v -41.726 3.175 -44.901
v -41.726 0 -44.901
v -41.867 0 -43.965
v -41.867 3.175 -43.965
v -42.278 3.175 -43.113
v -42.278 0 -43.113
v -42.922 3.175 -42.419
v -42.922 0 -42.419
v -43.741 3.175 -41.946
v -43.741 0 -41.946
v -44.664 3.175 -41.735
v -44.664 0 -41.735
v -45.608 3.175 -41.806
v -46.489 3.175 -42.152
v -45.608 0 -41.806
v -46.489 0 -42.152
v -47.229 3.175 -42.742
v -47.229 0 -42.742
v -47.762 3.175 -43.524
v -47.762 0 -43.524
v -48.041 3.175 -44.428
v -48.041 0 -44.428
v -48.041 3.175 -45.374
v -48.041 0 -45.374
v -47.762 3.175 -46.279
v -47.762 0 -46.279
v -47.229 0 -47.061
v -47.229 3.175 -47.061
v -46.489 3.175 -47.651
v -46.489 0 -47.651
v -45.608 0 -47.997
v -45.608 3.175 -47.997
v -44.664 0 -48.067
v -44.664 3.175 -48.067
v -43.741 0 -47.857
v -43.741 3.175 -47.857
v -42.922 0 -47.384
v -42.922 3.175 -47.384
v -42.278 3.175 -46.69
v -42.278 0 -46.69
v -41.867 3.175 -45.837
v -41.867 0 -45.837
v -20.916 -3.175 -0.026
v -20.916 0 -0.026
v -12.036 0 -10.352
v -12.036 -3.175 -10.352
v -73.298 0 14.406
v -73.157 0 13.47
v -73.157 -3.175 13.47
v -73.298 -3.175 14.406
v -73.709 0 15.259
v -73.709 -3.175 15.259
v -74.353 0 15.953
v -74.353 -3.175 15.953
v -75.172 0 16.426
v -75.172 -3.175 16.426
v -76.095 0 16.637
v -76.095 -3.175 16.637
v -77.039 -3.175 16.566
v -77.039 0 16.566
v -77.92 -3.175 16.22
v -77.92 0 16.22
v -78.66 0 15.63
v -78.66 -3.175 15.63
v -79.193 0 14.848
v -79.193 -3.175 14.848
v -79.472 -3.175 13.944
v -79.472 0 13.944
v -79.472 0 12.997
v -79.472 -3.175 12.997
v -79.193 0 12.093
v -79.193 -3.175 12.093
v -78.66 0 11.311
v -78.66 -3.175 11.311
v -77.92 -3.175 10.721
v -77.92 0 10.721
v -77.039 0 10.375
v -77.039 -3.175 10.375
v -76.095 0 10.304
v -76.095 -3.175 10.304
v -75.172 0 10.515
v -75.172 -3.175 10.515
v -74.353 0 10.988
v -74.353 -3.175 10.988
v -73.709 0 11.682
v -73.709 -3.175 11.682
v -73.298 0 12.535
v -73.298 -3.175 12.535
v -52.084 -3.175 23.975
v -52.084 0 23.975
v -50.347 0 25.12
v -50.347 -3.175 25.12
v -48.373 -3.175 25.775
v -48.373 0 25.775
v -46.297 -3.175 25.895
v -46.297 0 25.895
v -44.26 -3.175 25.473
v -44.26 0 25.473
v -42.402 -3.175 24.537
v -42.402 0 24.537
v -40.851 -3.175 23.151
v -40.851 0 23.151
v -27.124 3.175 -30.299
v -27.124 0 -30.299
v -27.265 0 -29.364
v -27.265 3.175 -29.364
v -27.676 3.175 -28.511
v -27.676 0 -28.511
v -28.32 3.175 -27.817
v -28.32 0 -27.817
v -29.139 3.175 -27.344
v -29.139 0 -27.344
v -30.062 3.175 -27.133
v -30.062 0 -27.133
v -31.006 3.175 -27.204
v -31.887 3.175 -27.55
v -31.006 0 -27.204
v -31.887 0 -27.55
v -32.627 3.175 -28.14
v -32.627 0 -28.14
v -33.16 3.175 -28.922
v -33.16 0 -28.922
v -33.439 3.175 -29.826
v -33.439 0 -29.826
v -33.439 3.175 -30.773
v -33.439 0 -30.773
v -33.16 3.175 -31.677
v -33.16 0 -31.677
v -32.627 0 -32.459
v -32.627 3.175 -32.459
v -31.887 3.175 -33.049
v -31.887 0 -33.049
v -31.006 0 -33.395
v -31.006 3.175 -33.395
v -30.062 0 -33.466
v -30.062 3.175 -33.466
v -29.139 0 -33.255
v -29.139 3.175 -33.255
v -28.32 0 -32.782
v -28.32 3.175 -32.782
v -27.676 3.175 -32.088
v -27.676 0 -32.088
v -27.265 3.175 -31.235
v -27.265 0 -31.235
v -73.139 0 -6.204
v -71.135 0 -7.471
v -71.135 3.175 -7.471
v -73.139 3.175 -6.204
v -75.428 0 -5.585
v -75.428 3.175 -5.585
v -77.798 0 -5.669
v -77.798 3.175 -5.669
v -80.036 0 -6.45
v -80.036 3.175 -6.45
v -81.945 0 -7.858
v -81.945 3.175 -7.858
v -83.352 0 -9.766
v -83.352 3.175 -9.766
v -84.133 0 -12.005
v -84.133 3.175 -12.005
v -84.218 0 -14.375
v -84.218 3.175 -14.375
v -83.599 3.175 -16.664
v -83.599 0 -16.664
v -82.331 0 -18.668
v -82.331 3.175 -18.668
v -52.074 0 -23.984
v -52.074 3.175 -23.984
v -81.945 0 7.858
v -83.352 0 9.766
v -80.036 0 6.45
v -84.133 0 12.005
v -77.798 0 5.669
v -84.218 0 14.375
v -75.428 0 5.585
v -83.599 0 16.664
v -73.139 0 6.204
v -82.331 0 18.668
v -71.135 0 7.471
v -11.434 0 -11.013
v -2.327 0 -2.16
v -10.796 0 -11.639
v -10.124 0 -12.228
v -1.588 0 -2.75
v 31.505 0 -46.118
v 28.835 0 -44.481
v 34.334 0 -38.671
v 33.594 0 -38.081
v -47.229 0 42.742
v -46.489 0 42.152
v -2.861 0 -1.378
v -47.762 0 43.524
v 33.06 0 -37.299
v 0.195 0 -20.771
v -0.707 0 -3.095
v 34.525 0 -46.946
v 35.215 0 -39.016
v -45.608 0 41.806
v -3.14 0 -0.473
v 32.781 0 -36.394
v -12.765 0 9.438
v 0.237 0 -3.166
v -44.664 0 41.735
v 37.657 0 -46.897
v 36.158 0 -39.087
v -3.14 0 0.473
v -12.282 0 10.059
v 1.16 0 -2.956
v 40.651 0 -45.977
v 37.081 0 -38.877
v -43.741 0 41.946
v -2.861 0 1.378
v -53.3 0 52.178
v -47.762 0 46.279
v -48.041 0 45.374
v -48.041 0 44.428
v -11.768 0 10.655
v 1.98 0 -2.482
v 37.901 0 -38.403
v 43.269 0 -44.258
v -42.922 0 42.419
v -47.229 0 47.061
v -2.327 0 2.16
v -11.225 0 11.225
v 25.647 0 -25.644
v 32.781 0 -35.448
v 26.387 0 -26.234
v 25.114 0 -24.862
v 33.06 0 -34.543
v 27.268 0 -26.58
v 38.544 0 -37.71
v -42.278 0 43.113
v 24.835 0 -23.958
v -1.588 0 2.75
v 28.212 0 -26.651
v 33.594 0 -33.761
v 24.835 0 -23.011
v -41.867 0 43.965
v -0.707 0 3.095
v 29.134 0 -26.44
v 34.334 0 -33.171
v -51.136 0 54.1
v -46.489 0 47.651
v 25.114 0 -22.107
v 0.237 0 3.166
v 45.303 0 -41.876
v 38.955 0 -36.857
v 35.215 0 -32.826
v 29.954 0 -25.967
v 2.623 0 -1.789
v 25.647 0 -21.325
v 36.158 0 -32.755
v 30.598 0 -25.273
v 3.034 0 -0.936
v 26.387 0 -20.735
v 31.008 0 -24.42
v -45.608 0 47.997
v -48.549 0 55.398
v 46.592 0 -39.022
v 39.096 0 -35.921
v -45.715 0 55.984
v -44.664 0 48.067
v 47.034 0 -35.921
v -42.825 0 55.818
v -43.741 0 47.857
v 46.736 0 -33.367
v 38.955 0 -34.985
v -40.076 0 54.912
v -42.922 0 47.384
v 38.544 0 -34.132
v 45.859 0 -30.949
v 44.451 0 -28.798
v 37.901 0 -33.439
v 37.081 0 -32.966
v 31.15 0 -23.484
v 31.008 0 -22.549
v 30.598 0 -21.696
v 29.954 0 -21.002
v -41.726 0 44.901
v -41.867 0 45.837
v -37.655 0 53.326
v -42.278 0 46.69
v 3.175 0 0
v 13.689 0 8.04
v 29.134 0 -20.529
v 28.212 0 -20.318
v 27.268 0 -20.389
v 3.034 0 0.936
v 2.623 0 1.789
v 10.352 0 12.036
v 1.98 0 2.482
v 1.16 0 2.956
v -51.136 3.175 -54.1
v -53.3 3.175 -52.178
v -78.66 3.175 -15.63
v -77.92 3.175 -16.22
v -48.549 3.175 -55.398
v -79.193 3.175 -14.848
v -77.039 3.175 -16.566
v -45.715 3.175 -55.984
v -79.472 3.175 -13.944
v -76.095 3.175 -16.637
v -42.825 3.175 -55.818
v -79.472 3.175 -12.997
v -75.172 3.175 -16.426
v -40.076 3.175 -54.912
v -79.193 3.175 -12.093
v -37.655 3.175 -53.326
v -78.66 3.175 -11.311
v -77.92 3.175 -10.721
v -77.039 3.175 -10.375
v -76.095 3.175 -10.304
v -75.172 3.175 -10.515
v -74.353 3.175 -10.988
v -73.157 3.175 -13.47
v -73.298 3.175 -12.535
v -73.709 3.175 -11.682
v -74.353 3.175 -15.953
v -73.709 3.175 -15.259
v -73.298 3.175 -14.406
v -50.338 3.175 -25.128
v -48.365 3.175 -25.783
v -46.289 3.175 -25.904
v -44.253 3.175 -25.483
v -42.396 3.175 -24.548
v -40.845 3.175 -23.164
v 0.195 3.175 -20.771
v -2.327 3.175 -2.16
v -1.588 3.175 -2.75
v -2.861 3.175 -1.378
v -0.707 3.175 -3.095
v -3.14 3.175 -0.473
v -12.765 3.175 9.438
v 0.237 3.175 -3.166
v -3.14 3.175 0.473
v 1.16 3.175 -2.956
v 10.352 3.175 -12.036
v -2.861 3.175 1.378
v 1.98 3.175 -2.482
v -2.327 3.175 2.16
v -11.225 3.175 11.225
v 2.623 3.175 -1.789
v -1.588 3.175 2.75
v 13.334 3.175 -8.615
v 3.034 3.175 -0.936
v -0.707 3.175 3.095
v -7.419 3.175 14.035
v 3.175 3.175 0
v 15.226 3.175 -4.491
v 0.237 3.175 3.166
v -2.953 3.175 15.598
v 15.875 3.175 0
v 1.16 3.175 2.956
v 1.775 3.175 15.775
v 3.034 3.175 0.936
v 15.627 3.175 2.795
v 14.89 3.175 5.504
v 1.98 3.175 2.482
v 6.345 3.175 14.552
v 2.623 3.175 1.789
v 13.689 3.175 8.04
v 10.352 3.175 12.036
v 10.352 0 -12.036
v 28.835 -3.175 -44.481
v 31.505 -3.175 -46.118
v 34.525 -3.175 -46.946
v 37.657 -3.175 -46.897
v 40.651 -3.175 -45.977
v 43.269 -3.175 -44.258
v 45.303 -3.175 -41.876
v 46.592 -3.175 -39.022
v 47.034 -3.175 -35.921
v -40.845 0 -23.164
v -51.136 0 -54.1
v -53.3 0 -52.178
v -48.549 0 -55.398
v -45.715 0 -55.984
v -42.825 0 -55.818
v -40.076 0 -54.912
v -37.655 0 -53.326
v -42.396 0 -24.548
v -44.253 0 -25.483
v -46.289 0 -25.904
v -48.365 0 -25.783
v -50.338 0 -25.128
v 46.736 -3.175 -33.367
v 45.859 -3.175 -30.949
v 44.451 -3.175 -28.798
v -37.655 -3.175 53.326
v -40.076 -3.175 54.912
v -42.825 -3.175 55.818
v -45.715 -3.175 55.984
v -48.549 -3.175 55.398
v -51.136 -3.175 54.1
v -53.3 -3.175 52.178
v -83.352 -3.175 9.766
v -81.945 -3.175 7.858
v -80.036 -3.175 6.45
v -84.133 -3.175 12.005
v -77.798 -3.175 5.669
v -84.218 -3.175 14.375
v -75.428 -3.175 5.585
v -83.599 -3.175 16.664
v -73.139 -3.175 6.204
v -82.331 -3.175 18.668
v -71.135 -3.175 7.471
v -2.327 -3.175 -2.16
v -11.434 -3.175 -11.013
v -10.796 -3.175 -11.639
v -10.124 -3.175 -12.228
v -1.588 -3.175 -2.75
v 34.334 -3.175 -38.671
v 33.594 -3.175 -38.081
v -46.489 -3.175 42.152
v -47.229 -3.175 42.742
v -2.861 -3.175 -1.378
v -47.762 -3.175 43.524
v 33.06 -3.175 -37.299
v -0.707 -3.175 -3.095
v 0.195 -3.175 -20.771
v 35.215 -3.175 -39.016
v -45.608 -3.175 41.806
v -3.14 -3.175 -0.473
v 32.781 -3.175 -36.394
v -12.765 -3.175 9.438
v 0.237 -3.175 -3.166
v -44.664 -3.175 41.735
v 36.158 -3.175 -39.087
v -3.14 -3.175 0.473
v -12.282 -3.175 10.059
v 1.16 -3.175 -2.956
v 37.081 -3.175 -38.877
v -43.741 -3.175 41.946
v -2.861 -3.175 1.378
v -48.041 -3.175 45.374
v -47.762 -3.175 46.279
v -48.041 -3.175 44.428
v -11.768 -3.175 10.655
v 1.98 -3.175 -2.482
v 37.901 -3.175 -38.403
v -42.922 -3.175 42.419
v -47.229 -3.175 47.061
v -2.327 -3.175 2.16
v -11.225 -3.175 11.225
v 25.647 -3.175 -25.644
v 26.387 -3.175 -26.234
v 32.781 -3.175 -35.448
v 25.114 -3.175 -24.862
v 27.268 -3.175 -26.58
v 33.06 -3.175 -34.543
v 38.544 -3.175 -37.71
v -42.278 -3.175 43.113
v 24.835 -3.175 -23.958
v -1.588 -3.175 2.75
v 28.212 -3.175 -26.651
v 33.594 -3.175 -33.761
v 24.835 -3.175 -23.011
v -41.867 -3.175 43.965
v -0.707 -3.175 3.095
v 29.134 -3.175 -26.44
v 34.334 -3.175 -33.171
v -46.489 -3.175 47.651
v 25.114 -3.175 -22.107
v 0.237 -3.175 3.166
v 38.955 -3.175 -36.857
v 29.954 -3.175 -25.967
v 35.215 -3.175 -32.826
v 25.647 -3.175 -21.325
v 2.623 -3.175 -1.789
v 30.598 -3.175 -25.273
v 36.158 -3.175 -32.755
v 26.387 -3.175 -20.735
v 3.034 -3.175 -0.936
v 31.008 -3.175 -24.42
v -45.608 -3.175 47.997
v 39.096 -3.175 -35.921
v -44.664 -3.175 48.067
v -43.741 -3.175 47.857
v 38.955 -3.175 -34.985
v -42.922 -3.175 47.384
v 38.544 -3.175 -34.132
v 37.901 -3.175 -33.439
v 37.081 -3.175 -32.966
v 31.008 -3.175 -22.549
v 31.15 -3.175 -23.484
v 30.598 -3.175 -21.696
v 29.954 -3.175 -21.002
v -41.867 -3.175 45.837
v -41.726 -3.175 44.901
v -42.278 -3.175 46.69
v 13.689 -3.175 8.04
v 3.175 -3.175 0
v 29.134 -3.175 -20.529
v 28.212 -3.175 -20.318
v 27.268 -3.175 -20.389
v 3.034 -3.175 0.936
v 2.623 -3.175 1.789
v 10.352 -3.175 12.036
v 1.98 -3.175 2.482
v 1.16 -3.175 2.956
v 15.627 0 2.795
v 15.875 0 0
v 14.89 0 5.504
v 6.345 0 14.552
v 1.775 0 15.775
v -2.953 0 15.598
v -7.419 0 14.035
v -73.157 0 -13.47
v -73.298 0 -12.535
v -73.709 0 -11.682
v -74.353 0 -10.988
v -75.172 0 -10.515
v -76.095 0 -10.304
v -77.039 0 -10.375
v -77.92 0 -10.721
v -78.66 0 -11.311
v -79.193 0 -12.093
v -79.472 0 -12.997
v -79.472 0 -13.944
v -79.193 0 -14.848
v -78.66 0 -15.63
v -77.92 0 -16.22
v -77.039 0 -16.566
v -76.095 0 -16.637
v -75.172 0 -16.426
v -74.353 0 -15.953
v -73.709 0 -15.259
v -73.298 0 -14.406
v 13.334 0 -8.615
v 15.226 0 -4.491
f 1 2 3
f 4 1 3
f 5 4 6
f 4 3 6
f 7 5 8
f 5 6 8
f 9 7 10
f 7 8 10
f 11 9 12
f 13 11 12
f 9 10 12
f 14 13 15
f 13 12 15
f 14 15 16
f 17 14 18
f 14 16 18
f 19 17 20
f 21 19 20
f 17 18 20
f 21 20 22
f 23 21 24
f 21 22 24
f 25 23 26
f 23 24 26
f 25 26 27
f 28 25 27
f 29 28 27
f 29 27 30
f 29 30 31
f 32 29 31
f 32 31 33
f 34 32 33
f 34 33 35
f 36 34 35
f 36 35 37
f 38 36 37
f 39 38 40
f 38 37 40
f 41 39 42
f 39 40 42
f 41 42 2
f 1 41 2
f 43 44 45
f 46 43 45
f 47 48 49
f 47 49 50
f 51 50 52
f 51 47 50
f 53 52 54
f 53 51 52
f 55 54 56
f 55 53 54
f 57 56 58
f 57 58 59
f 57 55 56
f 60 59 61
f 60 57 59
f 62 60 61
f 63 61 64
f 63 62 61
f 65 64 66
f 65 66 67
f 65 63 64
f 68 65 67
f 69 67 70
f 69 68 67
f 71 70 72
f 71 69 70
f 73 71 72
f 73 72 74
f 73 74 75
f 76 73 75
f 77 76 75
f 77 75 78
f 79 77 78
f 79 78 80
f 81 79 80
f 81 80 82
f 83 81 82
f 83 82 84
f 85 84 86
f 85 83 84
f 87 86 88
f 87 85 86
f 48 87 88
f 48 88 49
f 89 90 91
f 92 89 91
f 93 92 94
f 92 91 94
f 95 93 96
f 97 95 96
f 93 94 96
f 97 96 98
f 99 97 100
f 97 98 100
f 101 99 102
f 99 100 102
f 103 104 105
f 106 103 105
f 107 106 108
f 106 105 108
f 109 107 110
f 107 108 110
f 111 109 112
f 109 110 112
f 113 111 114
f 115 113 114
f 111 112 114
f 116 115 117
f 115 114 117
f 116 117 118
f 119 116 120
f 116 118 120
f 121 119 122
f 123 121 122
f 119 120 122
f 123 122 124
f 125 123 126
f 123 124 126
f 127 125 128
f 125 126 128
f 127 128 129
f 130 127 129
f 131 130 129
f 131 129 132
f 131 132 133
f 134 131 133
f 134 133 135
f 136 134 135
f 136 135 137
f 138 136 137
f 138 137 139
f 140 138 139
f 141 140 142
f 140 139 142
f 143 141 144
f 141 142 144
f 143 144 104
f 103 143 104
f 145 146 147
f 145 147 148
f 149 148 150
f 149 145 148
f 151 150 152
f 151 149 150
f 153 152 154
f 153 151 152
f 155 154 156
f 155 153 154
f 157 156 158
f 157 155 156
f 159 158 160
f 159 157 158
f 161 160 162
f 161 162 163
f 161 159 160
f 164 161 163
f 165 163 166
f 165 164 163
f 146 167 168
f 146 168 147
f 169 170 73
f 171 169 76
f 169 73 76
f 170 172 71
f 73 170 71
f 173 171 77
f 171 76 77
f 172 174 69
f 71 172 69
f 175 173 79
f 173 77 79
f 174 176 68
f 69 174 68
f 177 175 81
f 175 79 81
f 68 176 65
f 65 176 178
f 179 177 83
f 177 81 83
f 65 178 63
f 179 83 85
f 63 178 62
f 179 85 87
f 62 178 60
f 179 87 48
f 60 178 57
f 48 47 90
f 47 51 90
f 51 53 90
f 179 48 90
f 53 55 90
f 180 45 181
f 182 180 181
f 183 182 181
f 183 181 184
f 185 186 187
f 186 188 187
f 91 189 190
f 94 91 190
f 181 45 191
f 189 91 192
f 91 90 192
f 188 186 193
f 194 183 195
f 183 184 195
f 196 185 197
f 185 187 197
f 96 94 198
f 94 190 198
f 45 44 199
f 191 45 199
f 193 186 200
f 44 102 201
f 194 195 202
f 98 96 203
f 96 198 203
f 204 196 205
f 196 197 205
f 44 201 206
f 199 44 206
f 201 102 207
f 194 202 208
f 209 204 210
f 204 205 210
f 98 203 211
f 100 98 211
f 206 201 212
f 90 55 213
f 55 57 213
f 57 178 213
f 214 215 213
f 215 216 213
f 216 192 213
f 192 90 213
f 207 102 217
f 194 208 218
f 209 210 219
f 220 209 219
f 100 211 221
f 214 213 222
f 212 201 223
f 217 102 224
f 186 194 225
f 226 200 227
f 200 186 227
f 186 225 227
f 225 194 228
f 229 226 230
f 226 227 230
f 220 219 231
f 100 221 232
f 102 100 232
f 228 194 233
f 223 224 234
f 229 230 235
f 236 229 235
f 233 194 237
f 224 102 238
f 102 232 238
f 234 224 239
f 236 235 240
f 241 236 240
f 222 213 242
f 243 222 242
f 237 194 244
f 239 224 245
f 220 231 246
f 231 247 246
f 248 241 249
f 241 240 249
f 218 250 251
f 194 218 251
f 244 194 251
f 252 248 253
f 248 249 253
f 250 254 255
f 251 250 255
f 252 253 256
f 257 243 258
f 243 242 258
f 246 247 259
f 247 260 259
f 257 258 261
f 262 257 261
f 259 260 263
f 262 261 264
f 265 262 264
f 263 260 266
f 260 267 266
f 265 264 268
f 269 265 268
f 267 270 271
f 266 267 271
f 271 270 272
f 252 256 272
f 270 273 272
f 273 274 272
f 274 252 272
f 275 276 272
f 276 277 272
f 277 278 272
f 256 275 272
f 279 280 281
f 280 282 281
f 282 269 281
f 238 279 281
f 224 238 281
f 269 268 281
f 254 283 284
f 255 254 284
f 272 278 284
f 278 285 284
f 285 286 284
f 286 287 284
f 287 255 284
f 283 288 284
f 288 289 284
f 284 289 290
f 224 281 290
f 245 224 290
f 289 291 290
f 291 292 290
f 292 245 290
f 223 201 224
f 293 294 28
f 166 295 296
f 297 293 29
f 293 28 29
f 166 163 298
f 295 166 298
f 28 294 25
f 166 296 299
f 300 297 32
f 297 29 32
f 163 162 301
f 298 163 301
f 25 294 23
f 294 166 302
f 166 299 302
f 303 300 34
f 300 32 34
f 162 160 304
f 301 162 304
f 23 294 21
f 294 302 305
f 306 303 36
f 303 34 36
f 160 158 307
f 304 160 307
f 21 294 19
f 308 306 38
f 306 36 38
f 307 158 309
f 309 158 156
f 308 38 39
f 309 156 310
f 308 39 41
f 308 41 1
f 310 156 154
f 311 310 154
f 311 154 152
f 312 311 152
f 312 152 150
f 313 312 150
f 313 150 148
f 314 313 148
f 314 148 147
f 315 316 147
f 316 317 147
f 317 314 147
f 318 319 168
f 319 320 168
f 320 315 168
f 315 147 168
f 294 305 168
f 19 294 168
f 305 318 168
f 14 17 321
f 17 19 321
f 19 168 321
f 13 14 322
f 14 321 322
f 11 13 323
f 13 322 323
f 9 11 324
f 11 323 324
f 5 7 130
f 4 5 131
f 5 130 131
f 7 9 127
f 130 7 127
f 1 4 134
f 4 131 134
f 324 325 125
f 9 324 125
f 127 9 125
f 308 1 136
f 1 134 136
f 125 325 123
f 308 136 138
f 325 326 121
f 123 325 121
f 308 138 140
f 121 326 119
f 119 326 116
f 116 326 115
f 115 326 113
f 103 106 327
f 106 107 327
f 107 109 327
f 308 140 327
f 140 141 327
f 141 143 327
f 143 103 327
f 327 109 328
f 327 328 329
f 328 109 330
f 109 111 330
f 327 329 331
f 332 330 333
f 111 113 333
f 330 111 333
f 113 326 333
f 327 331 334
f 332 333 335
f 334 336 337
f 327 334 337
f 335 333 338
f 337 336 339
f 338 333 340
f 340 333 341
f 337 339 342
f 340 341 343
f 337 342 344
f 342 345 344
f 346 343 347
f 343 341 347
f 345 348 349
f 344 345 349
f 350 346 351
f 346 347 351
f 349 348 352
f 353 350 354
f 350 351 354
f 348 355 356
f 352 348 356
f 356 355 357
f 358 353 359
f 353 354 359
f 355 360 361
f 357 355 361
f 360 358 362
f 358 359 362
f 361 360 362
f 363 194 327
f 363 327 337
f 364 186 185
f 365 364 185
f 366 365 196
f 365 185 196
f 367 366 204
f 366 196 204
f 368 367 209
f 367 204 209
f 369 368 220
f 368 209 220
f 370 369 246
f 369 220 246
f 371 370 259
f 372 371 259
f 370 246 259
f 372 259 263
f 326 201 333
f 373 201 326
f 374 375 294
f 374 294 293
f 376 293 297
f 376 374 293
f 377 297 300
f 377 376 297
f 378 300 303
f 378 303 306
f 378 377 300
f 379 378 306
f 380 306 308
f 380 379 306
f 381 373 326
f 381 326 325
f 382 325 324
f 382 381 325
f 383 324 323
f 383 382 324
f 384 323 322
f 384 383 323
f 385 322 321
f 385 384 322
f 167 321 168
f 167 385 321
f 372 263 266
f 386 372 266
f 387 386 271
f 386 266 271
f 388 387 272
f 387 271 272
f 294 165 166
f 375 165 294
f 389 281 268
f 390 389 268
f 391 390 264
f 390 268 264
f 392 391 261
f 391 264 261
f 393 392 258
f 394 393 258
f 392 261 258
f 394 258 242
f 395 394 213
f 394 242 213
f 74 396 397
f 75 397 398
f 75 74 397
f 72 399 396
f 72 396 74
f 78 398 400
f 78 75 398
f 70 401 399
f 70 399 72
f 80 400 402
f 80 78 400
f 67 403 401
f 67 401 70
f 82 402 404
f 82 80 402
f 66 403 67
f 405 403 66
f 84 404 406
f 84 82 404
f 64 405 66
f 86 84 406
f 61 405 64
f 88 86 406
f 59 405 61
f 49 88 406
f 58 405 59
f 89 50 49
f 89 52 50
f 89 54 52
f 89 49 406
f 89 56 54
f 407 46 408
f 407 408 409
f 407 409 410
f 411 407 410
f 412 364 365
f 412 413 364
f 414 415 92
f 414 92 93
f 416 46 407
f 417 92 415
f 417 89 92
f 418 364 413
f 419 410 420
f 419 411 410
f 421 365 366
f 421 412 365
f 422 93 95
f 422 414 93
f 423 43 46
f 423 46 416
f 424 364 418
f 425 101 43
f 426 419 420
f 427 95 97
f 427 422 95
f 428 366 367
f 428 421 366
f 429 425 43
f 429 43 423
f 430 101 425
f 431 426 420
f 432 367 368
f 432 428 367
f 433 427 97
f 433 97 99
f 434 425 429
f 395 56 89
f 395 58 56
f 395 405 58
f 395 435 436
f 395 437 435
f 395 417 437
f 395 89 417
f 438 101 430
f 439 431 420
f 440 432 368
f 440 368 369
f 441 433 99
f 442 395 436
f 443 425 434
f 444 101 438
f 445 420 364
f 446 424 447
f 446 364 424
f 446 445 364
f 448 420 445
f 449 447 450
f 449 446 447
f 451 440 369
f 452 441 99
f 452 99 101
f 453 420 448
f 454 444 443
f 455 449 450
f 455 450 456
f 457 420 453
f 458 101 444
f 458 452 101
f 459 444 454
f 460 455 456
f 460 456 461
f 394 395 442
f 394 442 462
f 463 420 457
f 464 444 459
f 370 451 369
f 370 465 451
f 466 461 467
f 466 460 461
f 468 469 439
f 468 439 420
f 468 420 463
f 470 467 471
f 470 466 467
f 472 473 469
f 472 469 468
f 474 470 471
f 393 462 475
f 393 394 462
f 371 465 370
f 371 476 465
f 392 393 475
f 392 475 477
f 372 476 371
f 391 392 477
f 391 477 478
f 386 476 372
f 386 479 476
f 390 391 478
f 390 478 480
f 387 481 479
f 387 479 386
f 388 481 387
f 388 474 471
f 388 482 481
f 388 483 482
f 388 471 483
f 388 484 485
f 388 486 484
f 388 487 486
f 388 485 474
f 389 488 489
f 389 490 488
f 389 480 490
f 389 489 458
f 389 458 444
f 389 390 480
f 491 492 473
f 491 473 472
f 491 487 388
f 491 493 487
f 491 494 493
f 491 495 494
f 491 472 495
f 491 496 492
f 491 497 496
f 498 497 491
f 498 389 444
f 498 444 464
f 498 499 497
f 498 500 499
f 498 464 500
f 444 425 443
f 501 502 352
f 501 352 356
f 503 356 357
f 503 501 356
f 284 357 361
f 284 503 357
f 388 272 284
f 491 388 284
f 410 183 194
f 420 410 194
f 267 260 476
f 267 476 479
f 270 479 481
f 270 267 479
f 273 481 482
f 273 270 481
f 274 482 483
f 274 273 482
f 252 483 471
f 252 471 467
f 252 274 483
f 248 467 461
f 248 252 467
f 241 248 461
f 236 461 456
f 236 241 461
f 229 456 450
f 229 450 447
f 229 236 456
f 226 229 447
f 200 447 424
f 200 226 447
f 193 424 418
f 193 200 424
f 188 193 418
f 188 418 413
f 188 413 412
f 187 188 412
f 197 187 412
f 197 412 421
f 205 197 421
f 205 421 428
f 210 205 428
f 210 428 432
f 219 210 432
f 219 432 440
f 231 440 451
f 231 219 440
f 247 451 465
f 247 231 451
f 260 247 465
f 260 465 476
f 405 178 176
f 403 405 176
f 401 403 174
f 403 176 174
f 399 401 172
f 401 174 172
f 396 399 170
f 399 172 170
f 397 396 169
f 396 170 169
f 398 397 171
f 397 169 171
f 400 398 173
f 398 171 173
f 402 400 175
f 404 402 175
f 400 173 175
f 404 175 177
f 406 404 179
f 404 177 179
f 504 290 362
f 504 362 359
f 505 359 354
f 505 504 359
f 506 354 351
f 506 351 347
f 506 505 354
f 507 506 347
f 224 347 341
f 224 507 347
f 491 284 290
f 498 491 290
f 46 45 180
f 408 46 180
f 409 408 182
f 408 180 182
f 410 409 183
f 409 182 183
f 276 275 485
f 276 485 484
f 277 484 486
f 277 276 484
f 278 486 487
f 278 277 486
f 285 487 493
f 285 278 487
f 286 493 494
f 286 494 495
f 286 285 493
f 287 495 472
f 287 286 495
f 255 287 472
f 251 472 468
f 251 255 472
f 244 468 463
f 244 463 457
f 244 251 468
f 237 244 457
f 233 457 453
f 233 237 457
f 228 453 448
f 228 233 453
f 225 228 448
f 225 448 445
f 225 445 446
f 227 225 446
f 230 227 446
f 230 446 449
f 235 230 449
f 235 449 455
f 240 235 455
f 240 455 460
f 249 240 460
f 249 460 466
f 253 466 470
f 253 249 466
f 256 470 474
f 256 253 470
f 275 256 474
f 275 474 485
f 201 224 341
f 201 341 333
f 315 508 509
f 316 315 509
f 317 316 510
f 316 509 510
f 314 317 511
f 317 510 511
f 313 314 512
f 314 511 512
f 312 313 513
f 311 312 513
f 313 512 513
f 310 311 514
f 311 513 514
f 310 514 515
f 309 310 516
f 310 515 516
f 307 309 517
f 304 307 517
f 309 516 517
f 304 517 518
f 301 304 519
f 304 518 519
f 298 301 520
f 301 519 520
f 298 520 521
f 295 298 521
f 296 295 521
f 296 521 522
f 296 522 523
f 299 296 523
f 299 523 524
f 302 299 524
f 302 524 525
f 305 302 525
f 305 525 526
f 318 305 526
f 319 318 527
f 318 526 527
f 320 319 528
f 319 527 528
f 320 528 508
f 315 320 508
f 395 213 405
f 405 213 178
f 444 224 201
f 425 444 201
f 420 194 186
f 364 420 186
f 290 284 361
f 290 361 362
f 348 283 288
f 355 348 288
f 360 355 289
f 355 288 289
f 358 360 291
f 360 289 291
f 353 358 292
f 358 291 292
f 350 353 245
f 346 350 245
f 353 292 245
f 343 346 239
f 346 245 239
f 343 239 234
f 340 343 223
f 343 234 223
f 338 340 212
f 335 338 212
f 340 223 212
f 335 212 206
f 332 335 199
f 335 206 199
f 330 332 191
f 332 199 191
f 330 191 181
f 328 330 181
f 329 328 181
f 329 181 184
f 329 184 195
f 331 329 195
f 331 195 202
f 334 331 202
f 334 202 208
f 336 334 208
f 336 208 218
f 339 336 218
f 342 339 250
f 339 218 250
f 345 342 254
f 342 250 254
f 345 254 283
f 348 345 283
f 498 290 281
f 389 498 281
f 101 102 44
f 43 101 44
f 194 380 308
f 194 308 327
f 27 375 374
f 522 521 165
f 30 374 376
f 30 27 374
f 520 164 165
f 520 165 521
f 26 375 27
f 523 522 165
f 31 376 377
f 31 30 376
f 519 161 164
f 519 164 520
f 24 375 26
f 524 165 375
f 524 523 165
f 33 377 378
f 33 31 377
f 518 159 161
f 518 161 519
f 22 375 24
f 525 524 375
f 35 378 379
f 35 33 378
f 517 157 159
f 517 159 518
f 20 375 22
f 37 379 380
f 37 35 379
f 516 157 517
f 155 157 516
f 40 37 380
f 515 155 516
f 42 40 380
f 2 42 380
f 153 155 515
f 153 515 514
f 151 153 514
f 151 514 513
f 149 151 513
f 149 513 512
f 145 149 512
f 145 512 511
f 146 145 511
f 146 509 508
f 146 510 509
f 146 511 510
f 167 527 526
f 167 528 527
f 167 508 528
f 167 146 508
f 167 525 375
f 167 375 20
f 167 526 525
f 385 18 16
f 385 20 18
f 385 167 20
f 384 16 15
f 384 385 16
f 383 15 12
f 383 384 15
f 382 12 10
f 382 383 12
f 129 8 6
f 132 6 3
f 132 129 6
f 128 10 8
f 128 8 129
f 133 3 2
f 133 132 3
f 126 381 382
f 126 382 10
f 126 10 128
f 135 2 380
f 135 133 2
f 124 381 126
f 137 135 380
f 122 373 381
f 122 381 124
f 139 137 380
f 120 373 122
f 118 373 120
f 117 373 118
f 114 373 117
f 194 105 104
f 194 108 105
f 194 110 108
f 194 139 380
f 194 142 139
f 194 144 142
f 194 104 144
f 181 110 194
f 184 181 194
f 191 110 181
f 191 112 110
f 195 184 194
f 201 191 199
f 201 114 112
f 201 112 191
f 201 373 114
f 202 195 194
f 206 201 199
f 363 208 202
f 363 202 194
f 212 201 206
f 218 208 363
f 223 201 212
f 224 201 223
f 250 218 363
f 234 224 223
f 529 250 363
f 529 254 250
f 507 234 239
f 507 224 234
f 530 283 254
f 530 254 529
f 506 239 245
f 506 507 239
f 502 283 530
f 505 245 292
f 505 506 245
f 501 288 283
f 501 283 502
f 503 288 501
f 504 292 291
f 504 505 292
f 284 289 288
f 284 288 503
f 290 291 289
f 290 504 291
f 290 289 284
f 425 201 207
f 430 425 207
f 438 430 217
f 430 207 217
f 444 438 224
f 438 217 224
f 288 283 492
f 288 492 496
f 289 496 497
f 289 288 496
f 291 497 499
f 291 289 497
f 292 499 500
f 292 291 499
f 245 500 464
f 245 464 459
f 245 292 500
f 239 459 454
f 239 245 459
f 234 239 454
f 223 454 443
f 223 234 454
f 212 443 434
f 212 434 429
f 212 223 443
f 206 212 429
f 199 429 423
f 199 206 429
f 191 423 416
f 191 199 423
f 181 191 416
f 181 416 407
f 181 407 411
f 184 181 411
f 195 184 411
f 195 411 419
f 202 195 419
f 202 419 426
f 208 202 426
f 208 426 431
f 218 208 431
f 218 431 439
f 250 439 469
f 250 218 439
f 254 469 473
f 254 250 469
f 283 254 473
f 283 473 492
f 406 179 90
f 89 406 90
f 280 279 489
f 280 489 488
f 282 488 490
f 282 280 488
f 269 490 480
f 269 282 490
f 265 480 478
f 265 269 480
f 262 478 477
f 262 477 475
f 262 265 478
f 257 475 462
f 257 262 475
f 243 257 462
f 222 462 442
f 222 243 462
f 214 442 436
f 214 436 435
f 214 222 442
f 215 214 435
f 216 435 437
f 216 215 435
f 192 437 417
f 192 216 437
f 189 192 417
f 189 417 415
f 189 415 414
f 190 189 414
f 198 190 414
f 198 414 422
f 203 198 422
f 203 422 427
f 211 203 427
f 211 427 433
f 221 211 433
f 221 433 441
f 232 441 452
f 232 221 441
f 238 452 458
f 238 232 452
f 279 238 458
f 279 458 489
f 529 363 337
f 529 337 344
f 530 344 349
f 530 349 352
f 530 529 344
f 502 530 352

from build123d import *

# Parameters (mm, degrees)
F0_R     = 3.175
F0_R_2   = 3.9751
F1_DEPTH = 3.175
F2_DEPTH = 3.175


# Not quite as in the source:
# - a feature names something its author has since deleted; it is built from what else it names


with BuildPart() as f1:
    # F0 (on Front) → F1 (new body)
    with BuildSketch(Plane.XZ):
        with BuildLine():
            ThreePointArc((-71.1347575644, 7.4711561347), (-69.1121208226, 10.1727039932), (-68.3946770291, 13.4703841816))
            ThreePointArc((-68.3946770291, 13.4703841816), (-73.5586383483, 20.9075469092), (-82.331405076, 18.6678036462))
            ThreePointArc((-82.331405076, 18.6678036462), (-81.9448371048, 7.8577241059), (-71.1347575644, 7.4711561347))
        make_face()
        with Locations((-76.3321770291, 13.4703841816)):
            Circle(F0_R, mode=Mode.SUBTRACT)
        with BuildLine():
            ThreePointArc((-82.331405076, 18.6678036462), (-73.5586383483, 20.9075469092), (-68.3946770291, 13.4703841816))
            ThreePointArc((-68.3946770291, 13.4703841816), (-69.1121208226, 10.1727039932), (-71.1347575644, 7.4711561347))
            Line((-71.1347575644, 7.4711561347), (-52.0843267669, 23.9754595323))
            ThreePointArc((-52.0843267669, 23.9754595323), (-46.2965222838, 25.8954961667), (-40.8511612346, 23.1508168672))
            Line((-40.8511612346, 23.1508168672), (-20.9164773453, -0.0263913939))
            Line((-20.9164773453, -0.0263913939), (-12.7650204358, 9.4376839465))
            ThreePointArc((-12.7650204358, 9.4376839465), (-12.0284255483, 10.3601449714), (-11.2253201513, 11.2253201513))
            ThreePointArc((-11.2253201513, 11.2253201513), (-0.5957321126, 15.8638182116), (10.3518054047, 12.0356034274))
            Line((10.3518054047, 12.0356034274), (-37.655016822, 53.3262030046))
            ThreePointArc((-37.655016822, 53.3262030046), (-34.8014845049, 49.5361241819), (-33.7887806053, 44.9012806053))
            ThreePointArc((-33.7887806053, 44.9012806053), (-48.7842347585, 34.4892527868), (-53.300199871, 52.1776678558))
            Line((-53.300199871, 52.1776678558), (-82.331405076, 18.6678036462))
        make_face()
        with BuildLine():
            ThreePointArc((-37.655016822, 53.3262030046), (-45.7148756595, 55.9839571475), (-53.300199871, 52.1776678558))
            ThreePointArc((-53.300199871, 52.1776678558), (-48.7842347585, 34.4892527868), (-33.7887806053, 44.9012806053))
            ThreePointArc((-33.7887806053, 44.9012806053), (-34.8014845049, 49.5361241819), (-37.655016822, 53.3262030046))
        make_face()
        with Locations((-44.9012806053, 44.9012806053)):
            Circle(F0_R, mode=Mode.SUBTRACT)
        with BuildLine():
            Line((13.6886557503, 8.0396721793), (10.3518054047, 12.0356034274))
            ThreePointArc((10.3518054047, 12.0356034274), (-0.5957321126, 15.8638182116), (-11.2253201513, 11.2253201513))
            Line((-11.2253201513, 11.2253201513), (-12.7650204358, 9.4376839465))
            ThreePointArc((-12.7650204358, 9.4376839465), (-15.8642273117, -0.5847365245), (-12.0356034274, -10.3518054047))
            ThreePointArc((-12.0356034274, -10.3518054047), (-11.1192092809, -11.3304373246), (-10.1235074968, -12.2282550252))
            ThreePointArc((-10.1235074968, -12.2282550252), (0.1493608834, -15.8742973491), (10.3518055584, -12.0356032953))
            ThreePointArc((10.3518055584, -12.0356032953), (14.4282801858, -6.6212050173), (15.875, 0))
            ThreePointArc((15.875, 0), (15.3186656572, 4.1658261464), (13.6886557503, 8.0396721793))
        make_face()
        Circle(F0_R_2, mode=Mode.SUBTRACT)
        with BuildLine():
            Line((-12.7650204358, 9.4376839465), (-20.9164773453, -0.0263913939))
            Line((-20.9164773453, -0.0263913939), (-12.0356034274, -10.3518054047))
            ThreePointArc((-12.0356034274, -10.3518054047), (-15.8642273117, -0.5847365245), (-12.7650204358, 9.4376839465))
        make_face()
        with BuildLine():
            Line((44.4506274521, -28.7982771588), (13.6886557503, 8.0396721793))
            ThreePointArc((13.6886557503, 8.0396721793), (15.3186656572, 4.1658261464), (15.875, 0))
            ThreePointArc((15.875, 0), (14.4282801858, -6.6212050173), (10.3518055584, -12.0356032953))
            Line((10.3518055584, -12.0356032953), (0.1954344954, -20.7710836138))
            Line((0.1954344954, -20.7710836138), (28.8345692365, -44.4808030019))
            ThreePointArc((28.8345692365, -44.4808030019), (28.0466309813, -28.0800052132), (44.4506274521, -28.7982771588))
        make_face()
        with Locations((27.9745180668, -23.4843900063)):
            Circle(F0_R, mode=Mode.SUBTRACT)
        with BuildLine():
            ThreePointArc((47.0335244843, -35.9210244843), (46.3678629828, -32.132723858), (44.4506274521, -28.7982771588))
            ThreePointArc((44.4506274521, -28.7982771588), (28.0466309813, -28.0800052132), (28.8345692365, -44.4808030019))
            ThreePointArc((28.8345692365, -44.4808030019), (40.650687385, -45.9767663811), (47.0335244843, -35.9210244843))
        make_face()
        with Locations((35.9210244843, -35.9210244843)):
            Circle(F0_R, mode=Mode.SUBTRACT)
        with BuildLine():
            ThreePointArc((10.3518055584, -12.0356032953), (0.1493608834, -15.8742973491), (-10.1235074968, -12.2282550252))
            Line((-10.1235074968, -12.2282550252), (0.1954344954, -20.7710836138))
            Line((0.1954344954, -20.7710836138), (10.3518055584, -12.0356032953))
        make_face()
        Circle(F0_R_2)
        Circle(F0_R, mode=Mode.SUBTRACT)
    extrude(amount=F1_DEPTH)


with BuildPart() as f2:
    # F0 (on Front) → F2 (new body)
    with BuildSketch(Plane.XZ):
        with BuildLine():
            ThreePointArc((-68.3946770291, -13.4703841816), (-69.1121208226, -10.1727039932), (-71.1347575644, -7.4711561347))
            ThreePointArc((-71.1347575644, -7.4711561347), (-81.9448371048, -7.8577241059), (-82.331405076, -18.6678036462))
            ThreePointArc((-82.331405076, -18.6678036462), (-73.5586383483, -20.9075469092), (-68.3946770291, -13.4703841816))
        make_face()
        with Locations((-76.3321770291, -13.4703841816)):
            Circle(F0_R, mode=Mode.SUBTRACT)
        with BuildLine():
            Line((-12.0356034274, -10.3518054047), (-20.9164773453, -0.0263913939))
            Line((-20.9164773453, -0.0263913939), (-40.8447372902, -23.1636729395))
            ThreePointArc((-40.8447372902, -23.1636729395), (-46.2892514984, -25.9043770281), (-52.0743081406, -23.9841391495))
            Line((-52.0743081406, -23.9841391495), (-71.1347575644, -7.4711561347))
            ThreePointArc((-71.1347575644, -7.4711561347), (-69.1121208226, -10.1727039932), (-68.3946770291, -13.4703841816))
            ThreePointArc((-68.3946770291, -13.4703841816), (-73.5586383483, -20.9075469092), (-82.331405076, -18.6678036462))
            Line((-82.331405076, -18.6678036462), (-53.300199871, -52.1776678558))
            ThreePointArc((-53.300199871, -52.1776678558), (-48.7842347585, -34.4892527868), (-33.7887806053, -44.9012806053))
            ThreePointArc((-33.7887806053, -44.9012806053), (-34.8014845049, -49.5361241819), (-37.655016822, -53.3262030046))
            Line((-37.655016822, -53.3262030046), (0.1954344954, -20.7710836138))
            Line((0.1954344954, -20.7710836138), (-10.1235074968, -12.2282550252))
            ThreePointArc((-10.1235074968, -12.2282550252), (-11.1192092809, -11.3304373246), (-12.0356034274, -10.3518054047))
        make_face()
        with Locations((-30.2993841525, -30.2993841525)):
            Circle(F0_R, mode=Mode.SUBTRACT)
        with BuildLine():
            ThreePointArc((-53.300199871, -52.1776678558), (-45.7148756595, -55.9839571475), (-37.655016822, -53.3262030046))
            ThreePointArc((-37.655016822, -53.3262030046), (-34.8014845049, -49.5361241819), (-33.7887806053, -44.9012806053))
            ThreePointArc((-33.7887806053, -44.9012806053), (-48.7842347585, -34.4892527868), (-53.300199871, -52.1776678558))
        make_face()
        with Locations((-44.9012806053, -44.9012806053)):
            Circle(F0_R, mode=Mode.SUBTRACT)
        with BuildLine():
            ThreePointArc((10.3518055584, -12.0356032953), (0.1493608834, -15.8742973491), (-10.1235074968, -12.2282550252))
            Line((-10.1235074968, -12.2282550252), (0.1954344954, -20.7710836138))
            Line((0.1954344954, -20.7710836138), (10.3518055584, -12.0356032953))
        make_face()
        with BuildLine():
            Line((-12.7650204358, 9.4376839465), (-20.9164773453, -0.0263913939))
            Line((-20.9164773453, -0.0263913939), (-12.0356034274, -10.3518054047))
            ThreePointArc((-12.0356034274, -10.3518054047), (-15.8642273117, -0.5847365245), (-12.7650204358, 9.4376839465))
        make_face()
        with BuildLine():
            Line((13.6886557503, 8.0396721793), (10.3518054047, 12.0356034274))
            ThreePointArc((10.3518054047, 12.0356034274), (-0.5957321126, 15.8638182116), (-11.2253201513, 11.2253201513))
            Line((-11.2253201513, 11.2253201513), (-12.7650204358, 9.4376839465))
            ThreePointArc((-12.7650204358, 9.4376839465), (-15.8642273117, -0.5847365245), (-12.0356034274, -10.3518054047))
            ThreePointArc((-12.0356034274, -10.3518054047), (-11.1192092809, -11.3304373246), (-10.1235074968, -12.2282550252))
            ThreePointArc((-10.1235074968, -12.2282550252), (0.1493608834, -15.8742973491), (10.3518055584, -12.0356032953))
            ThreePointArc((10.3518055584, -12.0356032953), (14.4282801858, -6.6212050173), (15.875, 0))
            ThreePointArc((15.875, 0), (15.3186656572, 4.1658261464), (13.6886557503, 8.0396721793))
        make_face()
        Circle(F0_R_2, mode=Mode.SUBTRACT)
        Circle(F0_R_2)
        Circle(F0_R, mode=Mode.SUBTRACT)
    extrude(amount=-F2_DEPTH)


solid = Compound([f1.part, f2.part])
